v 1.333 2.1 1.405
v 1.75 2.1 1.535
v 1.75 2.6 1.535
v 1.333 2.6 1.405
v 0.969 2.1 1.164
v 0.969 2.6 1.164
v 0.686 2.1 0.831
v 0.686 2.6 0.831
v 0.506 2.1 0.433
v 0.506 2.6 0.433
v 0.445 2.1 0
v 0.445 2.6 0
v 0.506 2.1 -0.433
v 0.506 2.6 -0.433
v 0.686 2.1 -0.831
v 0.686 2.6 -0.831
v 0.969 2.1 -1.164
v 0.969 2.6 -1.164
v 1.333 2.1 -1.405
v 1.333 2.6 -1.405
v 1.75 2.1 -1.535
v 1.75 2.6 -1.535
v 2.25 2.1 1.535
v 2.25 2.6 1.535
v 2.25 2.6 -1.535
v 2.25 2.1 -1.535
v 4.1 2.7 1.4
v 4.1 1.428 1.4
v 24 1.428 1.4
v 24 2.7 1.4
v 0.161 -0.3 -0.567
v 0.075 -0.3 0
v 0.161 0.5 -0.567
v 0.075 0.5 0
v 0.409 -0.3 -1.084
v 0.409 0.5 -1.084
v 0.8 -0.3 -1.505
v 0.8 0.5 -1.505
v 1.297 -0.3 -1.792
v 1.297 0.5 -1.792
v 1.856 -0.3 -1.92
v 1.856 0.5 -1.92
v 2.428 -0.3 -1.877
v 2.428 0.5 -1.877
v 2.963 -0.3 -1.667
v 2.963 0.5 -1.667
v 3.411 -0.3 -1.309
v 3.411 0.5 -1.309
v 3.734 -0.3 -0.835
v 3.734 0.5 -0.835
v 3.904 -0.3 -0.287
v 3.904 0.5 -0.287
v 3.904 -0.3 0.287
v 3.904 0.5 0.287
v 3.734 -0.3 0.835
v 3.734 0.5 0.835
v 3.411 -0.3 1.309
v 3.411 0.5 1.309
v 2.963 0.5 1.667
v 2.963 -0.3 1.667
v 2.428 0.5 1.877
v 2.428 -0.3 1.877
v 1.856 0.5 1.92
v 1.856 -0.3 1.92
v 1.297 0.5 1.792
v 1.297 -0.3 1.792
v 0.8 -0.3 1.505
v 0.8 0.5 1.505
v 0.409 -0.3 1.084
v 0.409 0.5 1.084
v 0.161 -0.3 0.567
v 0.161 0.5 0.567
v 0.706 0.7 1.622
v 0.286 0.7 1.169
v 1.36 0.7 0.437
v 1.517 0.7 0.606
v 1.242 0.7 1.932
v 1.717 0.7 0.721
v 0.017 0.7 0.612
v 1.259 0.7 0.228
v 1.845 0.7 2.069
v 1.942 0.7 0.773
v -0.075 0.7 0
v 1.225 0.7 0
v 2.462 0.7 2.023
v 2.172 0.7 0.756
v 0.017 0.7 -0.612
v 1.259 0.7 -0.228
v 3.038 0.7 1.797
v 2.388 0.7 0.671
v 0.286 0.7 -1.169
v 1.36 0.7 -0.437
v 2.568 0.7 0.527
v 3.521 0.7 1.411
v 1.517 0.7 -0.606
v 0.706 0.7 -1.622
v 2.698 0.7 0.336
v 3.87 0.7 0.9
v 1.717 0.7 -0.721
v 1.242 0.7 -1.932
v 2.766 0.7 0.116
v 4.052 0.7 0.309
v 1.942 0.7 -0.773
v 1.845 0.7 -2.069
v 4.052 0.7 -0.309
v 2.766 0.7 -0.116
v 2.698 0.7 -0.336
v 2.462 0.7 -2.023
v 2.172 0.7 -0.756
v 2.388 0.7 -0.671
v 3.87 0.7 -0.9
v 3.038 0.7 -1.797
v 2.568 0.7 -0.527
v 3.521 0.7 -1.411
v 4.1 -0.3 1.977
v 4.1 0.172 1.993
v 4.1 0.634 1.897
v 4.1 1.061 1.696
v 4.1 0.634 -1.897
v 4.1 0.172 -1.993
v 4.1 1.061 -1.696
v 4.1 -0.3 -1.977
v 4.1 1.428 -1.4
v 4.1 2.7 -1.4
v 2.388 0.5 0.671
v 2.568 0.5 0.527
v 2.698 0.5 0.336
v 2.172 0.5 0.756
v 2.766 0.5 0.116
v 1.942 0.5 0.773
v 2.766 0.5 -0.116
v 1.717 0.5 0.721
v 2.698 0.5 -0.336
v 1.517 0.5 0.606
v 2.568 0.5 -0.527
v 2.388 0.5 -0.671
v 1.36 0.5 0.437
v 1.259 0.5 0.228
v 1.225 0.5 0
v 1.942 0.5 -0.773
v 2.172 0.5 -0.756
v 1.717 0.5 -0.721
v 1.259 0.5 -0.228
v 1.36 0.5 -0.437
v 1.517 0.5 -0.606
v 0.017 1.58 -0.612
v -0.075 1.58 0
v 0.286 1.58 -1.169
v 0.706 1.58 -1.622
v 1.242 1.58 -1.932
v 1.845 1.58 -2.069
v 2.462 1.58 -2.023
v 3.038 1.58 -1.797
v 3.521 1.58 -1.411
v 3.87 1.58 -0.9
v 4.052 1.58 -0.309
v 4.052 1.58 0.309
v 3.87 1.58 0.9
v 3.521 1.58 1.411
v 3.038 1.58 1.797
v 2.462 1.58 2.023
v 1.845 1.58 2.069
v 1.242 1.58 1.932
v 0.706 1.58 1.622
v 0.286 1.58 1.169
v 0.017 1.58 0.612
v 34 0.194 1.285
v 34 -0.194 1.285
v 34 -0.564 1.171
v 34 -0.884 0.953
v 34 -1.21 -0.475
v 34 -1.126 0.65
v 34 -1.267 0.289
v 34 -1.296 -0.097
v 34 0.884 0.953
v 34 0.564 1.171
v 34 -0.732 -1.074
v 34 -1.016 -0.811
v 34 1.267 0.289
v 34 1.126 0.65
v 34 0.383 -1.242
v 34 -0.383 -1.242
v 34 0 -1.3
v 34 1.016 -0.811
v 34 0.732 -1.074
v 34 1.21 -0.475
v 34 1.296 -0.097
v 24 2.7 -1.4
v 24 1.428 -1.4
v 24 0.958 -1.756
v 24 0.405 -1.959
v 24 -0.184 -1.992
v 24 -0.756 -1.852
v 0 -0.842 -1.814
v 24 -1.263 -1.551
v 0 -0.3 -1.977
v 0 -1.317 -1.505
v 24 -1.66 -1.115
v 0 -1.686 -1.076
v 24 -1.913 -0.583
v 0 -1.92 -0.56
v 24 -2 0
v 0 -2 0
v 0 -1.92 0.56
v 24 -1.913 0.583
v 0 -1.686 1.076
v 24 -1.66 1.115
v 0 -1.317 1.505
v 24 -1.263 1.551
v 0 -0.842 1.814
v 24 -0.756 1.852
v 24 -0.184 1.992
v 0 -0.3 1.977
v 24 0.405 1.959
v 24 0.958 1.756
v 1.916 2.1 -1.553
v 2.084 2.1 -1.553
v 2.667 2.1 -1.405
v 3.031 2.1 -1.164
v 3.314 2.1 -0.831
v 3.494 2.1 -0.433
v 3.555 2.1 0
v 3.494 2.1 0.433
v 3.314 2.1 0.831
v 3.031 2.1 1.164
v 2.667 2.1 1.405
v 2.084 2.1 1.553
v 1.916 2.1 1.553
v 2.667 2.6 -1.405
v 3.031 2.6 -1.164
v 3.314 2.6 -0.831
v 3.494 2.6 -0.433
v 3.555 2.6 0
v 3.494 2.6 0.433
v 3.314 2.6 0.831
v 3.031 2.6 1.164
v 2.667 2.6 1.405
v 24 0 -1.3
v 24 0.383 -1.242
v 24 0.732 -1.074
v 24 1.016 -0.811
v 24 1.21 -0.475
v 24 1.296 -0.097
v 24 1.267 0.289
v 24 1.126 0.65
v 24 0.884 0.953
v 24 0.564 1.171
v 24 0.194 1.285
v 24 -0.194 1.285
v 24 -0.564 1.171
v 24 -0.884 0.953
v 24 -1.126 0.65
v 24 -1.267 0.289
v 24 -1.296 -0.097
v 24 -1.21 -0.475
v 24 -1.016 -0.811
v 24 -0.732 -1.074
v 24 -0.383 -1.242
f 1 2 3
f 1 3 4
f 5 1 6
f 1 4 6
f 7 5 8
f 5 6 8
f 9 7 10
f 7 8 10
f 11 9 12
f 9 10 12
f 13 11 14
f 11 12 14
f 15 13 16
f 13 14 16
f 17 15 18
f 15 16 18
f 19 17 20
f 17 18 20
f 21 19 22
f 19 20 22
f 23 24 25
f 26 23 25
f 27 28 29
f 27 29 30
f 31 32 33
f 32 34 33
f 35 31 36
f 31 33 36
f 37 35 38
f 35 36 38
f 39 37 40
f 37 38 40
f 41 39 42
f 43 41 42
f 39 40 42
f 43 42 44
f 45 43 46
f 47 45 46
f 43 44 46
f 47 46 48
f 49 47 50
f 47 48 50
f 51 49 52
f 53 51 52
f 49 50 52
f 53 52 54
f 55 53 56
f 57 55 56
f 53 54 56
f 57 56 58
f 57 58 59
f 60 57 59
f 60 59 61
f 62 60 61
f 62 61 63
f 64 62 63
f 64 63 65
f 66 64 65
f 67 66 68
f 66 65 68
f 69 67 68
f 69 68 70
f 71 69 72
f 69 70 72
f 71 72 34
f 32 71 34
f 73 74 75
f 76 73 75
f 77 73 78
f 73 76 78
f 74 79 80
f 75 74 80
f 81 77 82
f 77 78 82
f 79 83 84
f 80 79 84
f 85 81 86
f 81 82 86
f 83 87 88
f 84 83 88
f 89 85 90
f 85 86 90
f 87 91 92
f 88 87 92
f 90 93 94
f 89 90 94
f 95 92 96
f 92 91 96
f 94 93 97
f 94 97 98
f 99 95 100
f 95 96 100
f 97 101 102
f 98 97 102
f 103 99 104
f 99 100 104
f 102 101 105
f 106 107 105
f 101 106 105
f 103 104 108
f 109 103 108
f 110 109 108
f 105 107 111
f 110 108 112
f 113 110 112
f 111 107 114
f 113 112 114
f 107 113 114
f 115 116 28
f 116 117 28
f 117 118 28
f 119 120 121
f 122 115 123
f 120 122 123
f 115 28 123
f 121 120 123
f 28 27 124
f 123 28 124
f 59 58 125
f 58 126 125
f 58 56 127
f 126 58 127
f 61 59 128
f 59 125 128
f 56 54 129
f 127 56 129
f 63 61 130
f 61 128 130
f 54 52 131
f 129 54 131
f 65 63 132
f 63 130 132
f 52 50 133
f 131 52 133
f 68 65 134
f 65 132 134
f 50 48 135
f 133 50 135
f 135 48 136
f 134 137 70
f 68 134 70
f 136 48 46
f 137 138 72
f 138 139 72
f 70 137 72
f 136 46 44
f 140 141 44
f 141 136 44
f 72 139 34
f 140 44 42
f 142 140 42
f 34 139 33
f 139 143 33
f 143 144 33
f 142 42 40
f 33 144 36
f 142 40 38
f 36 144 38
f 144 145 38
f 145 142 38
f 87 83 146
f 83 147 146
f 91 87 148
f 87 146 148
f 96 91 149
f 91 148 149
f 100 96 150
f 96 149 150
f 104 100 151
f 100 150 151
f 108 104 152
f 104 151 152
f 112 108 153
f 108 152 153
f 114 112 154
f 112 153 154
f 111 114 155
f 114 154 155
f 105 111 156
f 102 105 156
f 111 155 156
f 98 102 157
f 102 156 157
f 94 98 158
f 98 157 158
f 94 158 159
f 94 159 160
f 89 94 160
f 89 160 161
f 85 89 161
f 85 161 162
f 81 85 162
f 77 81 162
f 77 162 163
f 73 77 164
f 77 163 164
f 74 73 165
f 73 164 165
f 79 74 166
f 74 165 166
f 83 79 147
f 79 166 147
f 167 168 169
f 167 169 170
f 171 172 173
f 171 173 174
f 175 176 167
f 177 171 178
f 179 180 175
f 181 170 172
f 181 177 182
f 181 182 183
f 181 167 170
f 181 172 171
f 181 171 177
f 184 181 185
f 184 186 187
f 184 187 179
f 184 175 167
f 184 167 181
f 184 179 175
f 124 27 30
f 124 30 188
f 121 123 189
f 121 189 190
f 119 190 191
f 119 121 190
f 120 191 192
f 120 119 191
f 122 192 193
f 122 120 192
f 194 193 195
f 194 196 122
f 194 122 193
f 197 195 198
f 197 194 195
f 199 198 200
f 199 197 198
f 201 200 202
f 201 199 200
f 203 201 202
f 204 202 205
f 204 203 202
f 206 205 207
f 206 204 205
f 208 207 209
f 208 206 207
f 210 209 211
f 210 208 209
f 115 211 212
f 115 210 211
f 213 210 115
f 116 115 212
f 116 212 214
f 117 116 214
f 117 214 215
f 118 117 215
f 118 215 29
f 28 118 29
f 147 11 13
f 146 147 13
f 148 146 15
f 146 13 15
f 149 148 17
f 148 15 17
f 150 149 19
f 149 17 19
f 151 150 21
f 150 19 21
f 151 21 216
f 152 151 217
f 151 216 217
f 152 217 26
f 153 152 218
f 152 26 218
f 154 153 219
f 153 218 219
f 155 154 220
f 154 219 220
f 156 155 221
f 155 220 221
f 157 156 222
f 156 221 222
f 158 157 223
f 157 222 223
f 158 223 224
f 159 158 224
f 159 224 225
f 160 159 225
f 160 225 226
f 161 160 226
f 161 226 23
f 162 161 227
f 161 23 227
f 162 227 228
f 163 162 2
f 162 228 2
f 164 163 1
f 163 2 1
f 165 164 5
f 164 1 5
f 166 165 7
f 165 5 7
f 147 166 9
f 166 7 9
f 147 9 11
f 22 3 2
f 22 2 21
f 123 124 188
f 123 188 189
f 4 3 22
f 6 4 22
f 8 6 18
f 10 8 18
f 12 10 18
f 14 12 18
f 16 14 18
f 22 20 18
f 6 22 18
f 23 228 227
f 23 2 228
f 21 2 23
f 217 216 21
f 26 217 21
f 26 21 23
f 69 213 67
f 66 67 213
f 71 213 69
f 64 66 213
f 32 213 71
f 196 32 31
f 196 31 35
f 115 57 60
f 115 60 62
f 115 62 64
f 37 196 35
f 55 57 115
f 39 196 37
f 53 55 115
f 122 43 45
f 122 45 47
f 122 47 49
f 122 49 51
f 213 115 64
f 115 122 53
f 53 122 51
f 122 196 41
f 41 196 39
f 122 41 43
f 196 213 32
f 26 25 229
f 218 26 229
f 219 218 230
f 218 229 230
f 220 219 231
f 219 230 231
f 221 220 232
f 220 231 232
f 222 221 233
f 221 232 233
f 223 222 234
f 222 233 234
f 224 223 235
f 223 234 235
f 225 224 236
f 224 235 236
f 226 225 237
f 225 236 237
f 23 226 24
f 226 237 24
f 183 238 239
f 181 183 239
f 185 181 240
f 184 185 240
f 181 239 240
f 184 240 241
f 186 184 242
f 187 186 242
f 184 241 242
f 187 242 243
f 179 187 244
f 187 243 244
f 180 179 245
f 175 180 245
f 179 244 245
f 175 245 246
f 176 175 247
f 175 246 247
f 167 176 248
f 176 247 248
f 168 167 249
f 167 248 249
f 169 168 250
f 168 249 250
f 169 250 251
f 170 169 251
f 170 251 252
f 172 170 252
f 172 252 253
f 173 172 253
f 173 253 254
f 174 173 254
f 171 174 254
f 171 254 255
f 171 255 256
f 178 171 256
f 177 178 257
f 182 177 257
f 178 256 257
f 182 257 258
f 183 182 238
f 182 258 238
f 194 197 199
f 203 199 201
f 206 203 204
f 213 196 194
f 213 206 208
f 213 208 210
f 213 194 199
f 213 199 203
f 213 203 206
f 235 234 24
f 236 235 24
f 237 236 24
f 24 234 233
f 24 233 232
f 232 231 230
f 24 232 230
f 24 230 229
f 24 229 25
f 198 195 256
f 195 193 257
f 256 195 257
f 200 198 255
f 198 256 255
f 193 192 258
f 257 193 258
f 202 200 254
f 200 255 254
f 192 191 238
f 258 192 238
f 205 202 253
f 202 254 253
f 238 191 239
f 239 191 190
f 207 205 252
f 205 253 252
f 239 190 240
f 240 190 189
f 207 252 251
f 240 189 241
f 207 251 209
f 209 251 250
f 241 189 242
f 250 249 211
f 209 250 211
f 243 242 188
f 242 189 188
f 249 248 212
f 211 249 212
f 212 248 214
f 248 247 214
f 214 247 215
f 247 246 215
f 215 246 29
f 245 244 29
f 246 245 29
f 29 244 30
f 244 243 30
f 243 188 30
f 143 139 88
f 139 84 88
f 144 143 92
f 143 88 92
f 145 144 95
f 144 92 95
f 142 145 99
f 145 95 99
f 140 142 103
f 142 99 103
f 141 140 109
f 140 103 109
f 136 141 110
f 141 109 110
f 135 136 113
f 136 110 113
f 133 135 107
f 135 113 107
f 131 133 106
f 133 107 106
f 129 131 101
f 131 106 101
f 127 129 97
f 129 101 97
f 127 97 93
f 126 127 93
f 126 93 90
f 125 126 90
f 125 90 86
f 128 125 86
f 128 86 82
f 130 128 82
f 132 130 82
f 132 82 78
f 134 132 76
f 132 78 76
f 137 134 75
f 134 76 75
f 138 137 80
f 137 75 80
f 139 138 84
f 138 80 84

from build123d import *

# Parameters (mm, degrees)
BOSS_EXTRUDE1_DEPTH = 24
SKETCH2_W           = 8.2
SKETCH2_H           = 5
CUT_EXTRUDE1_DEPTH  = 3
SKETCH4_W           = 0.5
SKETCH4_H           = 5
CUT_EXTRUDE2_DEPTH  = 0.5
SKETCH5_R           = 1.3
BOSS_EXTRUDE2_DEPTH = 10


with BuildPart() as part:
    # Sketch1 → Boss-Extrude1 (new body)
    with BuildSketch(Plane(origin=(0, 0, 0), x_dir=(0, 0, -1), z_dir=(1, 0, 0))):
        with BuildLine():
            Line((-1.4, 2.7), (1.4, 2.7))
            Line((1.4, 2.7), (1.4, 1.428285686))
            ThreePointArc((1.4, 1.428285686), (0, -2), (-1.4, 1.428285686))
            Line((-1.4, 1.428285686), (-1.4, 2.7))
        make_face()
    extrude(amount=BOSS_EXTRUDE1_DEPTH)

    # Sketch2 → Cut-Extrude1 (cut)
    with BuildSketch(Plane(origin=(0, 2.7, 0), x_dir=(1, 0, 0), z_dir=(0, 1, 0))):
        Rectangle(SKETCH2_W, SKETCH2_H)
    extrude(amount=-CUT_EXTRUDE1_DEPTH, mode=Mode.SUBTRACT)

    # Sketch3 → Revolve1 (revolve)
    with BuildSketch(Plane.XY):
        Polygon((0.074999, 0.499998), (1.224998, 0.499998), (1.224998, 0.7), (-0.075005, 0.7), (-0.075005, 1.58), (0.445, 2.099999), (0.445, 2.599999), (2, 2.599999), (2, -0.3), (0.074999, -0.3), align=None)
    revolve(axis=Axis((2, 2.599999, 0), (0, -1, 0)))

    # Sketch4 → Cut-Extrude2 (cut)
    with BuildSketch(Plane(origin=(0, 2.599999, 0), x_dir=(1, 0, 0), z_dir=(0, 1, 0))):
        with Locations((2, 0)):
            Rectangle(SKETCH4_W, SKETCH4_H)
    extrude(amount=-CUT_EXTRUDE2_DEPTH, mode=Mode.SUBTRACT)

    # Sketch5 → Boss-Extrude2 (add)
    with BuildSketch(Plane(origin=(24, 0, 0), x_dir=(0, 0, -1), z_dir=(1, 0, 0))):
        Circle(SKETCH5_R)
    extrude(amount=BOSS_EXTRUDE2_DEPTH)


solid = part.part
